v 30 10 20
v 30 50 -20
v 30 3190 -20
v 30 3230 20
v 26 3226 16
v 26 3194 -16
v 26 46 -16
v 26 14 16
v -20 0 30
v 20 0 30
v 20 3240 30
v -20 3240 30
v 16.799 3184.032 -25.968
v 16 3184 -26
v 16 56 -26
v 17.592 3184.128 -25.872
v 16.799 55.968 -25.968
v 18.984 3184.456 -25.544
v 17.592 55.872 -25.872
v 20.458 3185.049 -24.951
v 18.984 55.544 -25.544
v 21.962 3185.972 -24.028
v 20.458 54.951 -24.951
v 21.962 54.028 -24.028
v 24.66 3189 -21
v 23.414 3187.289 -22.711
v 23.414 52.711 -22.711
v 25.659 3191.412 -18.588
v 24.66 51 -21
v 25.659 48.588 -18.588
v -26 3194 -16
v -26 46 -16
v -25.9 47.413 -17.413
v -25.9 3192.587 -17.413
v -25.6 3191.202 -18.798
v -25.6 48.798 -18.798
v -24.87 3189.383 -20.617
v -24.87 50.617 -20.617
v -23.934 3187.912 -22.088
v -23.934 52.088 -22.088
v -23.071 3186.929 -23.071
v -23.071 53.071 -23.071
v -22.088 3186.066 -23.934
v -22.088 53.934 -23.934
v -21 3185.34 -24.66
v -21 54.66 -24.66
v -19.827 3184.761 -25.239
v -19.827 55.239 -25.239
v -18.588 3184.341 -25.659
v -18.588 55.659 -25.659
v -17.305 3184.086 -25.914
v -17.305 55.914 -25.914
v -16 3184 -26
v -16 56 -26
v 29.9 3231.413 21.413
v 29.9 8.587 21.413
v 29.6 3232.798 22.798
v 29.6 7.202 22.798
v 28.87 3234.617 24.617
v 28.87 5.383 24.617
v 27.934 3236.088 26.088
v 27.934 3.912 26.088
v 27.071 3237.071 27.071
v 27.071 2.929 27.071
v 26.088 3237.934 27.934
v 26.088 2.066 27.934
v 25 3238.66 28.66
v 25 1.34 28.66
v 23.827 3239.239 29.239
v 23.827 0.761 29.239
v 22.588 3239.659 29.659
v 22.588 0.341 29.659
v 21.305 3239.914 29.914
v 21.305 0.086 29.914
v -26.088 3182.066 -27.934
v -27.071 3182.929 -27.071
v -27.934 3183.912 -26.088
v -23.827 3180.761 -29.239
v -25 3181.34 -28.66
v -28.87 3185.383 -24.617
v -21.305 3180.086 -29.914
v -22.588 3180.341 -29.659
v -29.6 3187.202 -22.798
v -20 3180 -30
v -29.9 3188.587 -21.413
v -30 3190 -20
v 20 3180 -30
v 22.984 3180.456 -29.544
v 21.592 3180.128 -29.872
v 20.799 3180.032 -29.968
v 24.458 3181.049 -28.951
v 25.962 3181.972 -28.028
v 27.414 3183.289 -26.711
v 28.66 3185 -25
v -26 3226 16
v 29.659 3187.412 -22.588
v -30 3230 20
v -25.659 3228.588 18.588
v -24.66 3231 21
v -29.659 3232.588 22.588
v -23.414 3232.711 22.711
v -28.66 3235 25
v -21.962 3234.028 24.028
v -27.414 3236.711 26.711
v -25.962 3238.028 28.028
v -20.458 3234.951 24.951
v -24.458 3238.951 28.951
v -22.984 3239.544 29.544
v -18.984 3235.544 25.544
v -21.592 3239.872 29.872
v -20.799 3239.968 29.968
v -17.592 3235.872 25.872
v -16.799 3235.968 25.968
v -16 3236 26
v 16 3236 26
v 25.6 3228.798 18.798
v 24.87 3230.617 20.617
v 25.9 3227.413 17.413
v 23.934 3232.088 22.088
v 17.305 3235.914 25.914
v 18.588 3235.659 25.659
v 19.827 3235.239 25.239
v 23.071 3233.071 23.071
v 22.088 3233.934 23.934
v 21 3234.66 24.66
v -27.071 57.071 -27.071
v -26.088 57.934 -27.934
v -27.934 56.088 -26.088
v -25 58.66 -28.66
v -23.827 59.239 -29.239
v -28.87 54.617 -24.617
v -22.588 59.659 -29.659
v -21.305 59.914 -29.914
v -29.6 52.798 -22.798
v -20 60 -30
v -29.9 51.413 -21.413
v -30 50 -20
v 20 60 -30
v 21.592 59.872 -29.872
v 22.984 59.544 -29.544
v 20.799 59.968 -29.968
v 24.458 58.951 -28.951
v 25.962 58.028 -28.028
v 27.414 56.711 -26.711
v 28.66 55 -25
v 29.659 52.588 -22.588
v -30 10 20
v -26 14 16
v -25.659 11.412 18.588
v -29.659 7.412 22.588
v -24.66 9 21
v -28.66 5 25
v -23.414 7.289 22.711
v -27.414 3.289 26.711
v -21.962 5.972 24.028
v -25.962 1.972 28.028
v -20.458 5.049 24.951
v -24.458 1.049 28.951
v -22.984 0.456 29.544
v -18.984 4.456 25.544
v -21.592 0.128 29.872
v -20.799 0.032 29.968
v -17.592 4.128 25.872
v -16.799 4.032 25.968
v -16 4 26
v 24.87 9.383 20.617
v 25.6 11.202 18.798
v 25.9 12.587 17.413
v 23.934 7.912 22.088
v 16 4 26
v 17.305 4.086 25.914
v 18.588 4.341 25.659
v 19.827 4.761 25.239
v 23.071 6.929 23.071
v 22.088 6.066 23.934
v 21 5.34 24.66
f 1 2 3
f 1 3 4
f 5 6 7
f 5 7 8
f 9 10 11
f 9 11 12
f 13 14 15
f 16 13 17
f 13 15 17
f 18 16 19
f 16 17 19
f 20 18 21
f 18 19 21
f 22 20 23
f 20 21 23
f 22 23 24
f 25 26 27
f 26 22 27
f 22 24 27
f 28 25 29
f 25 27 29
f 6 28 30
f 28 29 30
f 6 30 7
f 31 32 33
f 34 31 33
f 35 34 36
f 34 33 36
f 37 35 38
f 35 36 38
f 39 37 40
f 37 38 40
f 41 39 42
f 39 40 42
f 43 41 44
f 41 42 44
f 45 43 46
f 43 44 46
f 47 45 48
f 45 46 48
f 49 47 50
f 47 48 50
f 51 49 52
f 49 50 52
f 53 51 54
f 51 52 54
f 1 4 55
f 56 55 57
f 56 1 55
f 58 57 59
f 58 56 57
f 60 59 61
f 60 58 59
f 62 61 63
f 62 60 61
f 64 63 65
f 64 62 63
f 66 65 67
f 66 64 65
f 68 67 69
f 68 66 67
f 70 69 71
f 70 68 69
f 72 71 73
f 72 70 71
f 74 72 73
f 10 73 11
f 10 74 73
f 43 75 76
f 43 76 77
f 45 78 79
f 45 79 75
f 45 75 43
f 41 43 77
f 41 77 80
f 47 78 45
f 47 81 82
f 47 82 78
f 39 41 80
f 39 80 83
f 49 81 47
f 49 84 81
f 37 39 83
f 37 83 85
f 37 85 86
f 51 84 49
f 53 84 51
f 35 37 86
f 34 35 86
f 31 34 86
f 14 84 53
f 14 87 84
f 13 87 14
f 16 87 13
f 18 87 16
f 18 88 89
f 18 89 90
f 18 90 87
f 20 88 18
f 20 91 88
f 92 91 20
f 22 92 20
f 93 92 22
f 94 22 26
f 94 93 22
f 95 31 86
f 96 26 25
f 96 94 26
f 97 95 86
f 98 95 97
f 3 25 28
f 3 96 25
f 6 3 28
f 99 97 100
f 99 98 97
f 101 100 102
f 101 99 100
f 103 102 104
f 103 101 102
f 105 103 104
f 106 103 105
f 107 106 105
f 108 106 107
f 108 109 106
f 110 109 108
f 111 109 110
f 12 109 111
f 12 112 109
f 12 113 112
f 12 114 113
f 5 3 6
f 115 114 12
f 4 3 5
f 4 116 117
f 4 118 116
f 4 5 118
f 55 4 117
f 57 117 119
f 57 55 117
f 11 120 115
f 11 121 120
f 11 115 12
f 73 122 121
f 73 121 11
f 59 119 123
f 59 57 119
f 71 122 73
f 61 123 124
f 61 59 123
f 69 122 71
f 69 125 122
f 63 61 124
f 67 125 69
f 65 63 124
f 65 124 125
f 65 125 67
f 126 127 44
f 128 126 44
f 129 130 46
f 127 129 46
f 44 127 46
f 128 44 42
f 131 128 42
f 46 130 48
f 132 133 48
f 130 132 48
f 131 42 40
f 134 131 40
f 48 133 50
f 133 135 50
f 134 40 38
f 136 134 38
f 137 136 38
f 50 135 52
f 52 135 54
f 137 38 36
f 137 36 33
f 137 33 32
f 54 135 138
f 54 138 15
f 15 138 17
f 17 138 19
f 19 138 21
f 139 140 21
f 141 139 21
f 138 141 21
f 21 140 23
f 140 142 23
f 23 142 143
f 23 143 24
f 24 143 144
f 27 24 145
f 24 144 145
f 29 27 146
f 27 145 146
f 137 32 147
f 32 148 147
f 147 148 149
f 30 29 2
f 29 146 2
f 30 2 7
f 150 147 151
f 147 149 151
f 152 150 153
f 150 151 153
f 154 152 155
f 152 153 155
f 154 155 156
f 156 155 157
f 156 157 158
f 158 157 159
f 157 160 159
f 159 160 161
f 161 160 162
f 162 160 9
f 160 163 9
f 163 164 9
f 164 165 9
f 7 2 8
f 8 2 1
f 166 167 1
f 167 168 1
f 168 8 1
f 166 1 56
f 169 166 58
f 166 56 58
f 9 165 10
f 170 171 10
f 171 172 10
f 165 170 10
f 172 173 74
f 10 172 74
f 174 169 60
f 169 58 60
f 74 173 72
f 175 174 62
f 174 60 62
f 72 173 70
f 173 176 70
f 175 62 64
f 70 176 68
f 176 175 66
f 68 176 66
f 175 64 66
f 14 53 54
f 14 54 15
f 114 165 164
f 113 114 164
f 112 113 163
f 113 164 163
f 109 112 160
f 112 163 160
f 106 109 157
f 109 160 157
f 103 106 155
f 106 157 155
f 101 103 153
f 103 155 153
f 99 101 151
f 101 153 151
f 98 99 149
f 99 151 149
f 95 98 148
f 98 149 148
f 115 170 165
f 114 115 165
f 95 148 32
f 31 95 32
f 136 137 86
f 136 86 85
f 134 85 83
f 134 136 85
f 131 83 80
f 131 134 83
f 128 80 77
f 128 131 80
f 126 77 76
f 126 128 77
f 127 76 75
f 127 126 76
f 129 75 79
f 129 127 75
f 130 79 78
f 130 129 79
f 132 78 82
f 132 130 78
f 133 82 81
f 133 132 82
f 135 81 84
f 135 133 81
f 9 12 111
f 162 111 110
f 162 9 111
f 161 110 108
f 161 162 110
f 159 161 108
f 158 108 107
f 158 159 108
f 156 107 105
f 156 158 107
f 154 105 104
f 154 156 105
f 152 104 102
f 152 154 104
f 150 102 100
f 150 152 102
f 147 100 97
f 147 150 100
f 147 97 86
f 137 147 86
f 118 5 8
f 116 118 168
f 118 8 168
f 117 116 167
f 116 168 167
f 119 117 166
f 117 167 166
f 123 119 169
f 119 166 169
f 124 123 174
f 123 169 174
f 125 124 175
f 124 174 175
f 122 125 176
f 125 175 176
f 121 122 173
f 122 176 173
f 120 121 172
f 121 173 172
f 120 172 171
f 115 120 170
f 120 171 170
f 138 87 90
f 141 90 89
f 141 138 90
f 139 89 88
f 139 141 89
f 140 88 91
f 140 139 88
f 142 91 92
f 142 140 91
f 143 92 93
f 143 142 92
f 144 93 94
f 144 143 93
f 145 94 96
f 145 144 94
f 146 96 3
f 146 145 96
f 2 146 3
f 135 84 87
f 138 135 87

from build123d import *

# Parameters (mm, degrees)
EXTRUDE_1_DEPTH     = 3240
CUT_EXTRUDE_1_DEPTH = 3241.694370039


with BuildPart() as part:
    # Эскиз1 → Бобышка-Вытянуть1 (new body)
    with BuildSketch(Plane(origin=(0, 0, 0), x_dir=(1, 0, 0), z_dir=(0, 1, 0))):
        with BuildLine():
            Line((-20, 30), (20, 30))
            ThreePointArc((20, 30), (27.071067812, 27.071067812), (30, 20))
            Line((30, 20), (30, -20))
            ThreePointArc((30, -20), (27.071067812, -27.071067812), (20, -30))
            Line((20, -30), (-20, -30))
            ThreePointArc((-20, -30), (-27.071067812, -27.071067812), (-30, -20))
            Line((-30, -20), (-30, 20))
            ThreePointArc((-30, 20), (-27.071067812, 27.071067812), (-20, 30))
        make_face()
        with BuildLine():
            Line((-16, 26), (16, 26))
            ThreePointArc((16, 26), (23.071067812, 23.071067812), (26, 16))
            Line((26, 16), (26, -16))
            ThreePointArc((26, -16), (23.071067812, -23.071067812), (16, -26))
            Line((16, -26), (-16, -26))
            ThreePointArc((-16, -26), (-23.071067812, -23.071067812), (-26, -16))
            Line((-26, -16), (-26, 16))
            ThreePointArc((-26, 16), (-23.071067812, 23.071067812), (-16, 26))
        make_face(mode=Mode.SUBTRACT)
    extrude(amount=EXTRUDE_1_DEPTH)

    # Эскиз2 → Вырез-Вытянуть1 (cut, through all)
    with BuildSketch(Plane(origin=(30, 0, 0), x_dir=(0, 0, -1), z_dir=(1, 0, 0))):
        Polygon((-30, 0), (30, 0), (30, 60), align=None)
        Polygon((-30, 3240), (30, 3240), (30, 3180), align=None)
    extrude(amount=-CUT_EXTRUDE_1_DEPTH, mode=Mode.SUBTRACT)


solid = part.part
